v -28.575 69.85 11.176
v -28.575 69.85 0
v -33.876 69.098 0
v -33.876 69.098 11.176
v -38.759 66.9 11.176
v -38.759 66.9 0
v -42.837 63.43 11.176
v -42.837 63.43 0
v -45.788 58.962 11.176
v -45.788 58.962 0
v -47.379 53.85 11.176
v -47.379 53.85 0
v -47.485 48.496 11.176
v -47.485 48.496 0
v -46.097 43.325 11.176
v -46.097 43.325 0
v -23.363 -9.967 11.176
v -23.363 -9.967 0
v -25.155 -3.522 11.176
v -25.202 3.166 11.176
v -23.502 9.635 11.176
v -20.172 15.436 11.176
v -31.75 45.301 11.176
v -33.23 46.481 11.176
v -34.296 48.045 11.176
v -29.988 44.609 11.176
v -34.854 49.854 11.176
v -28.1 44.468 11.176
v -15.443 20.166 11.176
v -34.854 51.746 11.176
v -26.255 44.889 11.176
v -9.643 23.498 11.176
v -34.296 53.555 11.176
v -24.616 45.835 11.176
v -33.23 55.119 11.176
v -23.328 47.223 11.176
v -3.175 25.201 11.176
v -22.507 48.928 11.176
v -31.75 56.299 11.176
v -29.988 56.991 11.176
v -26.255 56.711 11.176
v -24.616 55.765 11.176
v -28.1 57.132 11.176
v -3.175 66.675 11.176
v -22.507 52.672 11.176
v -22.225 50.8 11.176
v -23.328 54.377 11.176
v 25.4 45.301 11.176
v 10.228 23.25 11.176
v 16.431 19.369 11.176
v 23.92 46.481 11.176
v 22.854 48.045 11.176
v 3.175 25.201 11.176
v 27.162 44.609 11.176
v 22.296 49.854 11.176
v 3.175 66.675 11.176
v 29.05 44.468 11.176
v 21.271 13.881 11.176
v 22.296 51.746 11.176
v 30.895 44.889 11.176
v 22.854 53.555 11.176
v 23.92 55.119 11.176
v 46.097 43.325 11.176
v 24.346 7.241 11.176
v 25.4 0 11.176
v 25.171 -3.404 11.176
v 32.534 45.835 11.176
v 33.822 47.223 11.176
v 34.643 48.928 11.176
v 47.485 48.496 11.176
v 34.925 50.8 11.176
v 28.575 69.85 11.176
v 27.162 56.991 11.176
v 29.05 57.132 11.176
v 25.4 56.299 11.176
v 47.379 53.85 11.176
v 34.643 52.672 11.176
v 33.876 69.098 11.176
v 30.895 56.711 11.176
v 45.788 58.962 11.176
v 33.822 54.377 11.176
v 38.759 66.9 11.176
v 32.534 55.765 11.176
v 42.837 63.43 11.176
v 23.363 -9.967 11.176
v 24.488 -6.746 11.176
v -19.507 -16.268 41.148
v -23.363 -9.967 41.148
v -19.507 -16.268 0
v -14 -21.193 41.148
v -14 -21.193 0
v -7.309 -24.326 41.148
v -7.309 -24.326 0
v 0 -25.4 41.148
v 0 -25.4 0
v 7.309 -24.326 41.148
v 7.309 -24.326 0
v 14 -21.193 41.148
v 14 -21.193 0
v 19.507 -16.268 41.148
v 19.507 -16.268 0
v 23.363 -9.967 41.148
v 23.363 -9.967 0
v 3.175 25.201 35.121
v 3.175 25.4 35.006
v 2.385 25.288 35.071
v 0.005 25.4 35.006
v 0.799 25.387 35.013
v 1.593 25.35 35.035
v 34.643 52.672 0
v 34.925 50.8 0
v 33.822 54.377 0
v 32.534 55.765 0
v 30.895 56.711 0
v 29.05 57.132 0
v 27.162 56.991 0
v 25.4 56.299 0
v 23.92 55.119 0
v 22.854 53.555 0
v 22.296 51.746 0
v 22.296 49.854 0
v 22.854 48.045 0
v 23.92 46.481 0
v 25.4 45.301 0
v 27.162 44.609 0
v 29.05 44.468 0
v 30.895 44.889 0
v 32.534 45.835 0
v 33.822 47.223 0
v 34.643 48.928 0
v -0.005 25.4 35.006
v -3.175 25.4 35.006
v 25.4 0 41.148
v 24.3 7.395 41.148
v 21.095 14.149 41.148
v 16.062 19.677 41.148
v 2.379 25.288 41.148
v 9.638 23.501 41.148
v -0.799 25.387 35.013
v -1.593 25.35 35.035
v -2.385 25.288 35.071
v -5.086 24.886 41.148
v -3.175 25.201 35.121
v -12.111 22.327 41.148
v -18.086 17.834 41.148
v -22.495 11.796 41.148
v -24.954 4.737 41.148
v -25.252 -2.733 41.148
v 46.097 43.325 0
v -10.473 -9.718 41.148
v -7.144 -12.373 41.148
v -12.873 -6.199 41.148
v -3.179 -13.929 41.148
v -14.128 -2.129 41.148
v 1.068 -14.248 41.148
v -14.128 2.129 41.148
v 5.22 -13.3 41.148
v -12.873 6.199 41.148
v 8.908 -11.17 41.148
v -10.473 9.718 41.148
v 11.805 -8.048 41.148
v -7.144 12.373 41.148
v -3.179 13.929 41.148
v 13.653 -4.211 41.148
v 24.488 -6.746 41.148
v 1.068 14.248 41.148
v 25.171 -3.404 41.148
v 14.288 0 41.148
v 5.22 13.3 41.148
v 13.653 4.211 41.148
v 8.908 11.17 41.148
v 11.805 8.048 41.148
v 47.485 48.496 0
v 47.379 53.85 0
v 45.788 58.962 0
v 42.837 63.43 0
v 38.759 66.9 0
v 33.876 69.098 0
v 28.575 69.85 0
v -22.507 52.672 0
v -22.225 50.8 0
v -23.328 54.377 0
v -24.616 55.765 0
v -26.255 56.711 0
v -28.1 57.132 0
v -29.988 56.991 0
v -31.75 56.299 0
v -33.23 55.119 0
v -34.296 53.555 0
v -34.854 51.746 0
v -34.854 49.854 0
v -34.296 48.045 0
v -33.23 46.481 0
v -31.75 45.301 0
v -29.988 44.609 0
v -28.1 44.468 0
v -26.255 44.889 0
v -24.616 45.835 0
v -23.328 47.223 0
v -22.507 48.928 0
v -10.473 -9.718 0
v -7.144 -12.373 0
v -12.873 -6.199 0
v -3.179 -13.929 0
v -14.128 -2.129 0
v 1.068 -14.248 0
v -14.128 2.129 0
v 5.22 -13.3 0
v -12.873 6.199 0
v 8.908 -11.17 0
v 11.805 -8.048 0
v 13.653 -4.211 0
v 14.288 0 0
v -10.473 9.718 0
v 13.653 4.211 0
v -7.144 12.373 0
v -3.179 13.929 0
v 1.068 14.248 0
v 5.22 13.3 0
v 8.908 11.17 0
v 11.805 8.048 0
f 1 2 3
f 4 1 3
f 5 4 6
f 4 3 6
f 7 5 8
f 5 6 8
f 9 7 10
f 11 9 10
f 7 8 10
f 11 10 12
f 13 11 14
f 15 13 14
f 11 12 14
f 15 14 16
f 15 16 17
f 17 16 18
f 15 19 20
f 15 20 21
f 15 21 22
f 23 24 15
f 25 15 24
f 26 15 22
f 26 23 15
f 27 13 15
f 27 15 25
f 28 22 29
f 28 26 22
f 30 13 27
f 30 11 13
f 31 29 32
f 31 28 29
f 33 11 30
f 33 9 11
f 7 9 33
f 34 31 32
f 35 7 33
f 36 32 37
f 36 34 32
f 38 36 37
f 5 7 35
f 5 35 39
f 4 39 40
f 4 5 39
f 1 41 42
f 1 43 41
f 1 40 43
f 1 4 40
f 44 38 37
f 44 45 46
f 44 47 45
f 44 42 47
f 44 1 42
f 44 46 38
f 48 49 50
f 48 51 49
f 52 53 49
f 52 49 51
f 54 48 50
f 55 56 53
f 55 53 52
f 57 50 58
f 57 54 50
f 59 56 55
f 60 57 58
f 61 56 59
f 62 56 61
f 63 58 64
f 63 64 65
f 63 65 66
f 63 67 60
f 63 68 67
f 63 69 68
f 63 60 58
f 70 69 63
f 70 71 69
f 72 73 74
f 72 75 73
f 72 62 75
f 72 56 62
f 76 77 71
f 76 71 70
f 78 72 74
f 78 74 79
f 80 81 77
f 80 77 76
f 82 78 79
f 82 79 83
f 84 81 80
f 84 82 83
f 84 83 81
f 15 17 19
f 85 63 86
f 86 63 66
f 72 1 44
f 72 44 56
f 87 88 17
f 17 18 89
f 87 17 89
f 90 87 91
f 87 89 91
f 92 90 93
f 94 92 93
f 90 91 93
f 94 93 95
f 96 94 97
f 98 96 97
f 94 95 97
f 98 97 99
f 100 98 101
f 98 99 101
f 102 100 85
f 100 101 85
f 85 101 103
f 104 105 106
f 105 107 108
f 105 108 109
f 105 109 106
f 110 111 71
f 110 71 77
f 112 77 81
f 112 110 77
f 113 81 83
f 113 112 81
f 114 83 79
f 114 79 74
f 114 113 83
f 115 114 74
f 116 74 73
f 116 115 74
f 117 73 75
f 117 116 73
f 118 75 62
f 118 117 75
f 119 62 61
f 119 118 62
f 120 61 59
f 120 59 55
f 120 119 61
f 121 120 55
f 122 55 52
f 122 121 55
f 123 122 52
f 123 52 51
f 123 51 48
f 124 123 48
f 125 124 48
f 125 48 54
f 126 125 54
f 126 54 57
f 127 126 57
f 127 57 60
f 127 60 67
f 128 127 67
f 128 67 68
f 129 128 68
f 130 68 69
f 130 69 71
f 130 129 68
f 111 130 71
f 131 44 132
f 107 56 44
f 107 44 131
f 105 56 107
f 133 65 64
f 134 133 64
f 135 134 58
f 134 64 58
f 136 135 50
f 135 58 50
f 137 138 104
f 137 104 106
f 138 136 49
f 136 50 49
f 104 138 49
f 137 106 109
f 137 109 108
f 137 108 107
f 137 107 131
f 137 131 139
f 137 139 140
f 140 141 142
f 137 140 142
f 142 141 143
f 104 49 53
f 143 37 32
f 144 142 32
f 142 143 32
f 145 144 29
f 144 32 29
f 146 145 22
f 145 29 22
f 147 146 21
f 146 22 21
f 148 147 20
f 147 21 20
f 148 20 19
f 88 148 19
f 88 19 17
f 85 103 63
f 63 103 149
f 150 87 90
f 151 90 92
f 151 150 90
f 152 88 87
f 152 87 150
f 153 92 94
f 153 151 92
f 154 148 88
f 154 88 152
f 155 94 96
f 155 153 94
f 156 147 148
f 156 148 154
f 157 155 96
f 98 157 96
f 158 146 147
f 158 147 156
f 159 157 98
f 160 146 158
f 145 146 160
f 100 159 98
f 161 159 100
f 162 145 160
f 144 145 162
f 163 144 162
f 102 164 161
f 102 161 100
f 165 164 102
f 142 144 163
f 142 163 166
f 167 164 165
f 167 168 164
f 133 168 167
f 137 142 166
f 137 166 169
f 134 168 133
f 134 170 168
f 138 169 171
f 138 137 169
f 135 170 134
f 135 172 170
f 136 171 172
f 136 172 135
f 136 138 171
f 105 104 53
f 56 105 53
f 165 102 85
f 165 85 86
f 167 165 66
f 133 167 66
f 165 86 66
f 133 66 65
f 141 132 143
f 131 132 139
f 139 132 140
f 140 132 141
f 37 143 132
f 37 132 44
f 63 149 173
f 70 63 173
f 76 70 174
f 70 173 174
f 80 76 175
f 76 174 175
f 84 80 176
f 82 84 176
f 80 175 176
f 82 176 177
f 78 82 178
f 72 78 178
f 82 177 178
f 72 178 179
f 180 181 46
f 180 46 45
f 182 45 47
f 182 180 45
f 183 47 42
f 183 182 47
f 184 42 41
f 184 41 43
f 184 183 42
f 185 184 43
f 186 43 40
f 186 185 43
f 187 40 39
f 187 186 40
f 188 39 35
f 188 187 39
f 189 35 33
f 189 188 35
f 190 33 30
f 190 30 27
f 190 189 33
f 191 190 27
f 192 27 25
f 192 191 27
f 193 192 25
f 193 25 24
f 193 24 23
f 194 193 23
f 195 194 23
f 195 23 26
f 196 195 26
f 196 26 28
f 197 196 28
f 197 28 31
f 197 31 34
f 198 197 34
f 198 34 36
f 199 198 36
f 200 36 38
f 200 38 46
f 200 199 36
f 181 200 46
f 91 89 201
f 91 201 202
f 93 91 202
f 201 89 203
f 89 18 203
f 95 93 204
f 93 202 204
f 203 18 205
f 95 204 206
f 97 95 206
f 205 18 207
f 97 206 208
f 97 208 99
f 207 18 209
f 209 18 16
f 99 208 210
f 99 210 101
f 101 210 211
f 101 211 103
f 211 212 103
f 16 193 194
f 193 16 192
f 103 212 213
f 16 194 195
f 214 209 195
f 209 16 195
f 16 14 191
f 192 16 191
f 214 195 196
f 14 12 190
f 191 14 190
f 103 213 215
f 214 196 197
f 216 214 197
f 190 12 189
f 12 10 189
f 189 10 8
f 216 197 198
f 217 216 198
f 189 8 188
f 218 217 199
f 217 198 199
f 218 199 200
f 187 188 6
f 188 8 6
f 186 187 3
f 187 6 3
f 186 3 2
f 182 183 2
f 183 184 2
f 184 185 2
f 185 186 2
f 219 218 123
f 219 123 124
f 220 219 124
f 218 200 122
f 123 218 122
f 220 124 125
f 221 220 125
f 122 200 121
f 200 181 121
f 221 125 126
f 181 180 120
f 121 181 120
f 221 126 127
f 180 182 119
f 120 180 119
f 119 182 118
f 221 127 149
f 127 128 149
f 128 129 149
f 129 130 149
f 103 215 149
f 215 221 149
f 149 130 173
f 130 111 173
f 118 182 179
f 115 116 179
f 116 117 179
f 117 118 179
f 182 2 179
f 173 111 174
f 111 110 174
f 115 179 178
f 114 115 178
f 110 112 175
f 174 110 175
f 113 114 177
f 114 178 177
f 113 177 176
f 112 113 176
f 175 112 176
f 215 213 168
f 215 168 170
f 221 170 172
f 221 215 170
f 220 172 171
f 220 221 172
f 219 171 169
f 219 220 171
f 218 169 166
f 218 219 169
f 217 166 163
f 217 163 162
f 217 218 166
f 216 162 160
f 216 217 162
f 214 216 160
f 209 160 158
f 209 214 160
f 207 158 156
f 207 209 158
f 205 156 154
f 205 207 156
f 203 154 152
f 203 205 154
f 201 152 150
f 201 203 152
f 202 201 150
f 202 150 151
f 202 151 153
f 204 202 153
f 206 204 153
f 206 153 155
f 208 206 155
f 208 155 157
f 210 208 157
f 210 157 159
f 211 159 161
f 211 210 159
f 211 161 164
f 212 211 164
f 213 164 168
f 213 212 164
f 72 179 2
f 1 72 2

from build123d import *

# Parameters (mm, degrees)
F0_R     = 14.2875
F1_DEPTH = 41.148
F0_R_2   = 6.35
F2_DEPTH = 11.176
F4_DEPTH = 3.175


with BuildPart() as f1:
    # F0 (on Top) → F1 (new body)
    with BuildSketch(Plane.XY):
        with BuildLine():
            ThreePointArc((23.36292, -9.966643), (24.88552, -5.086346), (25.4, 0))
            ThreePointArc((25.4, 0), (-5.086346, 24.88552), (-23.36292, -9.966643))
            ThreePointArc((-23.36292, -9.966643), (0, -25.4), (23.36292, -9.966643))
        make_face()
        Circle(F0_R, mode=Mode.SUBTRACT)
    extrude(amount=F1_DEPTH)

    # F0 (on Top) → F2 (join)
    with BuildSketch(Plane.XY):
        with BuildLine():
            ThreePointArc((-23.36292, -9.966643), (-5.086346, 24.88552), (25.4, 0))
            ThreePointArc((25.4, 0), (24.88552, -5.086346), (23.36292, -9.966643))
            Line((23.36292, -9.966643), (46.09719, 43.325018))
            ThreePointArc((46.09719, 43.325018), (44.469982, 61.300097), (28.575, 69.85))
            Line((28.575, 69.85), (-28.575, 69.85))
            ThreePointArc((-28.575, 69.85), (-44.469982, 61.300097), (-46.09719, 43.325018))
            Line((-46.09719, 43.325018), (-23.36292, -9.966643))
        make_face()
        with Locations((-28.575, 50.8)):
            Circle(F0_R_2, mode=Mode.SUBTRACT)
        with Locations((28.575, 50.8)):
            Circle(F0_R_2, mode=Mode.SUBTRACT)
    extrude(amount=F2_DEPTH)

    # F3 (on Right) → F4 (join, symmetric)
    with BuildSketch(Plane.YZ):
        Polygon((66.675, 11.176), (25.4, 35.006132), (25.4, 11.176), align=None)
        Polygon((25.4, 11.176), (25.4, 35.006132), (22.225, 36.839219), (22.225, 11.176), align=None)
    extrude(amount=F4_DEPTH, both=True)


solid = f1.part
